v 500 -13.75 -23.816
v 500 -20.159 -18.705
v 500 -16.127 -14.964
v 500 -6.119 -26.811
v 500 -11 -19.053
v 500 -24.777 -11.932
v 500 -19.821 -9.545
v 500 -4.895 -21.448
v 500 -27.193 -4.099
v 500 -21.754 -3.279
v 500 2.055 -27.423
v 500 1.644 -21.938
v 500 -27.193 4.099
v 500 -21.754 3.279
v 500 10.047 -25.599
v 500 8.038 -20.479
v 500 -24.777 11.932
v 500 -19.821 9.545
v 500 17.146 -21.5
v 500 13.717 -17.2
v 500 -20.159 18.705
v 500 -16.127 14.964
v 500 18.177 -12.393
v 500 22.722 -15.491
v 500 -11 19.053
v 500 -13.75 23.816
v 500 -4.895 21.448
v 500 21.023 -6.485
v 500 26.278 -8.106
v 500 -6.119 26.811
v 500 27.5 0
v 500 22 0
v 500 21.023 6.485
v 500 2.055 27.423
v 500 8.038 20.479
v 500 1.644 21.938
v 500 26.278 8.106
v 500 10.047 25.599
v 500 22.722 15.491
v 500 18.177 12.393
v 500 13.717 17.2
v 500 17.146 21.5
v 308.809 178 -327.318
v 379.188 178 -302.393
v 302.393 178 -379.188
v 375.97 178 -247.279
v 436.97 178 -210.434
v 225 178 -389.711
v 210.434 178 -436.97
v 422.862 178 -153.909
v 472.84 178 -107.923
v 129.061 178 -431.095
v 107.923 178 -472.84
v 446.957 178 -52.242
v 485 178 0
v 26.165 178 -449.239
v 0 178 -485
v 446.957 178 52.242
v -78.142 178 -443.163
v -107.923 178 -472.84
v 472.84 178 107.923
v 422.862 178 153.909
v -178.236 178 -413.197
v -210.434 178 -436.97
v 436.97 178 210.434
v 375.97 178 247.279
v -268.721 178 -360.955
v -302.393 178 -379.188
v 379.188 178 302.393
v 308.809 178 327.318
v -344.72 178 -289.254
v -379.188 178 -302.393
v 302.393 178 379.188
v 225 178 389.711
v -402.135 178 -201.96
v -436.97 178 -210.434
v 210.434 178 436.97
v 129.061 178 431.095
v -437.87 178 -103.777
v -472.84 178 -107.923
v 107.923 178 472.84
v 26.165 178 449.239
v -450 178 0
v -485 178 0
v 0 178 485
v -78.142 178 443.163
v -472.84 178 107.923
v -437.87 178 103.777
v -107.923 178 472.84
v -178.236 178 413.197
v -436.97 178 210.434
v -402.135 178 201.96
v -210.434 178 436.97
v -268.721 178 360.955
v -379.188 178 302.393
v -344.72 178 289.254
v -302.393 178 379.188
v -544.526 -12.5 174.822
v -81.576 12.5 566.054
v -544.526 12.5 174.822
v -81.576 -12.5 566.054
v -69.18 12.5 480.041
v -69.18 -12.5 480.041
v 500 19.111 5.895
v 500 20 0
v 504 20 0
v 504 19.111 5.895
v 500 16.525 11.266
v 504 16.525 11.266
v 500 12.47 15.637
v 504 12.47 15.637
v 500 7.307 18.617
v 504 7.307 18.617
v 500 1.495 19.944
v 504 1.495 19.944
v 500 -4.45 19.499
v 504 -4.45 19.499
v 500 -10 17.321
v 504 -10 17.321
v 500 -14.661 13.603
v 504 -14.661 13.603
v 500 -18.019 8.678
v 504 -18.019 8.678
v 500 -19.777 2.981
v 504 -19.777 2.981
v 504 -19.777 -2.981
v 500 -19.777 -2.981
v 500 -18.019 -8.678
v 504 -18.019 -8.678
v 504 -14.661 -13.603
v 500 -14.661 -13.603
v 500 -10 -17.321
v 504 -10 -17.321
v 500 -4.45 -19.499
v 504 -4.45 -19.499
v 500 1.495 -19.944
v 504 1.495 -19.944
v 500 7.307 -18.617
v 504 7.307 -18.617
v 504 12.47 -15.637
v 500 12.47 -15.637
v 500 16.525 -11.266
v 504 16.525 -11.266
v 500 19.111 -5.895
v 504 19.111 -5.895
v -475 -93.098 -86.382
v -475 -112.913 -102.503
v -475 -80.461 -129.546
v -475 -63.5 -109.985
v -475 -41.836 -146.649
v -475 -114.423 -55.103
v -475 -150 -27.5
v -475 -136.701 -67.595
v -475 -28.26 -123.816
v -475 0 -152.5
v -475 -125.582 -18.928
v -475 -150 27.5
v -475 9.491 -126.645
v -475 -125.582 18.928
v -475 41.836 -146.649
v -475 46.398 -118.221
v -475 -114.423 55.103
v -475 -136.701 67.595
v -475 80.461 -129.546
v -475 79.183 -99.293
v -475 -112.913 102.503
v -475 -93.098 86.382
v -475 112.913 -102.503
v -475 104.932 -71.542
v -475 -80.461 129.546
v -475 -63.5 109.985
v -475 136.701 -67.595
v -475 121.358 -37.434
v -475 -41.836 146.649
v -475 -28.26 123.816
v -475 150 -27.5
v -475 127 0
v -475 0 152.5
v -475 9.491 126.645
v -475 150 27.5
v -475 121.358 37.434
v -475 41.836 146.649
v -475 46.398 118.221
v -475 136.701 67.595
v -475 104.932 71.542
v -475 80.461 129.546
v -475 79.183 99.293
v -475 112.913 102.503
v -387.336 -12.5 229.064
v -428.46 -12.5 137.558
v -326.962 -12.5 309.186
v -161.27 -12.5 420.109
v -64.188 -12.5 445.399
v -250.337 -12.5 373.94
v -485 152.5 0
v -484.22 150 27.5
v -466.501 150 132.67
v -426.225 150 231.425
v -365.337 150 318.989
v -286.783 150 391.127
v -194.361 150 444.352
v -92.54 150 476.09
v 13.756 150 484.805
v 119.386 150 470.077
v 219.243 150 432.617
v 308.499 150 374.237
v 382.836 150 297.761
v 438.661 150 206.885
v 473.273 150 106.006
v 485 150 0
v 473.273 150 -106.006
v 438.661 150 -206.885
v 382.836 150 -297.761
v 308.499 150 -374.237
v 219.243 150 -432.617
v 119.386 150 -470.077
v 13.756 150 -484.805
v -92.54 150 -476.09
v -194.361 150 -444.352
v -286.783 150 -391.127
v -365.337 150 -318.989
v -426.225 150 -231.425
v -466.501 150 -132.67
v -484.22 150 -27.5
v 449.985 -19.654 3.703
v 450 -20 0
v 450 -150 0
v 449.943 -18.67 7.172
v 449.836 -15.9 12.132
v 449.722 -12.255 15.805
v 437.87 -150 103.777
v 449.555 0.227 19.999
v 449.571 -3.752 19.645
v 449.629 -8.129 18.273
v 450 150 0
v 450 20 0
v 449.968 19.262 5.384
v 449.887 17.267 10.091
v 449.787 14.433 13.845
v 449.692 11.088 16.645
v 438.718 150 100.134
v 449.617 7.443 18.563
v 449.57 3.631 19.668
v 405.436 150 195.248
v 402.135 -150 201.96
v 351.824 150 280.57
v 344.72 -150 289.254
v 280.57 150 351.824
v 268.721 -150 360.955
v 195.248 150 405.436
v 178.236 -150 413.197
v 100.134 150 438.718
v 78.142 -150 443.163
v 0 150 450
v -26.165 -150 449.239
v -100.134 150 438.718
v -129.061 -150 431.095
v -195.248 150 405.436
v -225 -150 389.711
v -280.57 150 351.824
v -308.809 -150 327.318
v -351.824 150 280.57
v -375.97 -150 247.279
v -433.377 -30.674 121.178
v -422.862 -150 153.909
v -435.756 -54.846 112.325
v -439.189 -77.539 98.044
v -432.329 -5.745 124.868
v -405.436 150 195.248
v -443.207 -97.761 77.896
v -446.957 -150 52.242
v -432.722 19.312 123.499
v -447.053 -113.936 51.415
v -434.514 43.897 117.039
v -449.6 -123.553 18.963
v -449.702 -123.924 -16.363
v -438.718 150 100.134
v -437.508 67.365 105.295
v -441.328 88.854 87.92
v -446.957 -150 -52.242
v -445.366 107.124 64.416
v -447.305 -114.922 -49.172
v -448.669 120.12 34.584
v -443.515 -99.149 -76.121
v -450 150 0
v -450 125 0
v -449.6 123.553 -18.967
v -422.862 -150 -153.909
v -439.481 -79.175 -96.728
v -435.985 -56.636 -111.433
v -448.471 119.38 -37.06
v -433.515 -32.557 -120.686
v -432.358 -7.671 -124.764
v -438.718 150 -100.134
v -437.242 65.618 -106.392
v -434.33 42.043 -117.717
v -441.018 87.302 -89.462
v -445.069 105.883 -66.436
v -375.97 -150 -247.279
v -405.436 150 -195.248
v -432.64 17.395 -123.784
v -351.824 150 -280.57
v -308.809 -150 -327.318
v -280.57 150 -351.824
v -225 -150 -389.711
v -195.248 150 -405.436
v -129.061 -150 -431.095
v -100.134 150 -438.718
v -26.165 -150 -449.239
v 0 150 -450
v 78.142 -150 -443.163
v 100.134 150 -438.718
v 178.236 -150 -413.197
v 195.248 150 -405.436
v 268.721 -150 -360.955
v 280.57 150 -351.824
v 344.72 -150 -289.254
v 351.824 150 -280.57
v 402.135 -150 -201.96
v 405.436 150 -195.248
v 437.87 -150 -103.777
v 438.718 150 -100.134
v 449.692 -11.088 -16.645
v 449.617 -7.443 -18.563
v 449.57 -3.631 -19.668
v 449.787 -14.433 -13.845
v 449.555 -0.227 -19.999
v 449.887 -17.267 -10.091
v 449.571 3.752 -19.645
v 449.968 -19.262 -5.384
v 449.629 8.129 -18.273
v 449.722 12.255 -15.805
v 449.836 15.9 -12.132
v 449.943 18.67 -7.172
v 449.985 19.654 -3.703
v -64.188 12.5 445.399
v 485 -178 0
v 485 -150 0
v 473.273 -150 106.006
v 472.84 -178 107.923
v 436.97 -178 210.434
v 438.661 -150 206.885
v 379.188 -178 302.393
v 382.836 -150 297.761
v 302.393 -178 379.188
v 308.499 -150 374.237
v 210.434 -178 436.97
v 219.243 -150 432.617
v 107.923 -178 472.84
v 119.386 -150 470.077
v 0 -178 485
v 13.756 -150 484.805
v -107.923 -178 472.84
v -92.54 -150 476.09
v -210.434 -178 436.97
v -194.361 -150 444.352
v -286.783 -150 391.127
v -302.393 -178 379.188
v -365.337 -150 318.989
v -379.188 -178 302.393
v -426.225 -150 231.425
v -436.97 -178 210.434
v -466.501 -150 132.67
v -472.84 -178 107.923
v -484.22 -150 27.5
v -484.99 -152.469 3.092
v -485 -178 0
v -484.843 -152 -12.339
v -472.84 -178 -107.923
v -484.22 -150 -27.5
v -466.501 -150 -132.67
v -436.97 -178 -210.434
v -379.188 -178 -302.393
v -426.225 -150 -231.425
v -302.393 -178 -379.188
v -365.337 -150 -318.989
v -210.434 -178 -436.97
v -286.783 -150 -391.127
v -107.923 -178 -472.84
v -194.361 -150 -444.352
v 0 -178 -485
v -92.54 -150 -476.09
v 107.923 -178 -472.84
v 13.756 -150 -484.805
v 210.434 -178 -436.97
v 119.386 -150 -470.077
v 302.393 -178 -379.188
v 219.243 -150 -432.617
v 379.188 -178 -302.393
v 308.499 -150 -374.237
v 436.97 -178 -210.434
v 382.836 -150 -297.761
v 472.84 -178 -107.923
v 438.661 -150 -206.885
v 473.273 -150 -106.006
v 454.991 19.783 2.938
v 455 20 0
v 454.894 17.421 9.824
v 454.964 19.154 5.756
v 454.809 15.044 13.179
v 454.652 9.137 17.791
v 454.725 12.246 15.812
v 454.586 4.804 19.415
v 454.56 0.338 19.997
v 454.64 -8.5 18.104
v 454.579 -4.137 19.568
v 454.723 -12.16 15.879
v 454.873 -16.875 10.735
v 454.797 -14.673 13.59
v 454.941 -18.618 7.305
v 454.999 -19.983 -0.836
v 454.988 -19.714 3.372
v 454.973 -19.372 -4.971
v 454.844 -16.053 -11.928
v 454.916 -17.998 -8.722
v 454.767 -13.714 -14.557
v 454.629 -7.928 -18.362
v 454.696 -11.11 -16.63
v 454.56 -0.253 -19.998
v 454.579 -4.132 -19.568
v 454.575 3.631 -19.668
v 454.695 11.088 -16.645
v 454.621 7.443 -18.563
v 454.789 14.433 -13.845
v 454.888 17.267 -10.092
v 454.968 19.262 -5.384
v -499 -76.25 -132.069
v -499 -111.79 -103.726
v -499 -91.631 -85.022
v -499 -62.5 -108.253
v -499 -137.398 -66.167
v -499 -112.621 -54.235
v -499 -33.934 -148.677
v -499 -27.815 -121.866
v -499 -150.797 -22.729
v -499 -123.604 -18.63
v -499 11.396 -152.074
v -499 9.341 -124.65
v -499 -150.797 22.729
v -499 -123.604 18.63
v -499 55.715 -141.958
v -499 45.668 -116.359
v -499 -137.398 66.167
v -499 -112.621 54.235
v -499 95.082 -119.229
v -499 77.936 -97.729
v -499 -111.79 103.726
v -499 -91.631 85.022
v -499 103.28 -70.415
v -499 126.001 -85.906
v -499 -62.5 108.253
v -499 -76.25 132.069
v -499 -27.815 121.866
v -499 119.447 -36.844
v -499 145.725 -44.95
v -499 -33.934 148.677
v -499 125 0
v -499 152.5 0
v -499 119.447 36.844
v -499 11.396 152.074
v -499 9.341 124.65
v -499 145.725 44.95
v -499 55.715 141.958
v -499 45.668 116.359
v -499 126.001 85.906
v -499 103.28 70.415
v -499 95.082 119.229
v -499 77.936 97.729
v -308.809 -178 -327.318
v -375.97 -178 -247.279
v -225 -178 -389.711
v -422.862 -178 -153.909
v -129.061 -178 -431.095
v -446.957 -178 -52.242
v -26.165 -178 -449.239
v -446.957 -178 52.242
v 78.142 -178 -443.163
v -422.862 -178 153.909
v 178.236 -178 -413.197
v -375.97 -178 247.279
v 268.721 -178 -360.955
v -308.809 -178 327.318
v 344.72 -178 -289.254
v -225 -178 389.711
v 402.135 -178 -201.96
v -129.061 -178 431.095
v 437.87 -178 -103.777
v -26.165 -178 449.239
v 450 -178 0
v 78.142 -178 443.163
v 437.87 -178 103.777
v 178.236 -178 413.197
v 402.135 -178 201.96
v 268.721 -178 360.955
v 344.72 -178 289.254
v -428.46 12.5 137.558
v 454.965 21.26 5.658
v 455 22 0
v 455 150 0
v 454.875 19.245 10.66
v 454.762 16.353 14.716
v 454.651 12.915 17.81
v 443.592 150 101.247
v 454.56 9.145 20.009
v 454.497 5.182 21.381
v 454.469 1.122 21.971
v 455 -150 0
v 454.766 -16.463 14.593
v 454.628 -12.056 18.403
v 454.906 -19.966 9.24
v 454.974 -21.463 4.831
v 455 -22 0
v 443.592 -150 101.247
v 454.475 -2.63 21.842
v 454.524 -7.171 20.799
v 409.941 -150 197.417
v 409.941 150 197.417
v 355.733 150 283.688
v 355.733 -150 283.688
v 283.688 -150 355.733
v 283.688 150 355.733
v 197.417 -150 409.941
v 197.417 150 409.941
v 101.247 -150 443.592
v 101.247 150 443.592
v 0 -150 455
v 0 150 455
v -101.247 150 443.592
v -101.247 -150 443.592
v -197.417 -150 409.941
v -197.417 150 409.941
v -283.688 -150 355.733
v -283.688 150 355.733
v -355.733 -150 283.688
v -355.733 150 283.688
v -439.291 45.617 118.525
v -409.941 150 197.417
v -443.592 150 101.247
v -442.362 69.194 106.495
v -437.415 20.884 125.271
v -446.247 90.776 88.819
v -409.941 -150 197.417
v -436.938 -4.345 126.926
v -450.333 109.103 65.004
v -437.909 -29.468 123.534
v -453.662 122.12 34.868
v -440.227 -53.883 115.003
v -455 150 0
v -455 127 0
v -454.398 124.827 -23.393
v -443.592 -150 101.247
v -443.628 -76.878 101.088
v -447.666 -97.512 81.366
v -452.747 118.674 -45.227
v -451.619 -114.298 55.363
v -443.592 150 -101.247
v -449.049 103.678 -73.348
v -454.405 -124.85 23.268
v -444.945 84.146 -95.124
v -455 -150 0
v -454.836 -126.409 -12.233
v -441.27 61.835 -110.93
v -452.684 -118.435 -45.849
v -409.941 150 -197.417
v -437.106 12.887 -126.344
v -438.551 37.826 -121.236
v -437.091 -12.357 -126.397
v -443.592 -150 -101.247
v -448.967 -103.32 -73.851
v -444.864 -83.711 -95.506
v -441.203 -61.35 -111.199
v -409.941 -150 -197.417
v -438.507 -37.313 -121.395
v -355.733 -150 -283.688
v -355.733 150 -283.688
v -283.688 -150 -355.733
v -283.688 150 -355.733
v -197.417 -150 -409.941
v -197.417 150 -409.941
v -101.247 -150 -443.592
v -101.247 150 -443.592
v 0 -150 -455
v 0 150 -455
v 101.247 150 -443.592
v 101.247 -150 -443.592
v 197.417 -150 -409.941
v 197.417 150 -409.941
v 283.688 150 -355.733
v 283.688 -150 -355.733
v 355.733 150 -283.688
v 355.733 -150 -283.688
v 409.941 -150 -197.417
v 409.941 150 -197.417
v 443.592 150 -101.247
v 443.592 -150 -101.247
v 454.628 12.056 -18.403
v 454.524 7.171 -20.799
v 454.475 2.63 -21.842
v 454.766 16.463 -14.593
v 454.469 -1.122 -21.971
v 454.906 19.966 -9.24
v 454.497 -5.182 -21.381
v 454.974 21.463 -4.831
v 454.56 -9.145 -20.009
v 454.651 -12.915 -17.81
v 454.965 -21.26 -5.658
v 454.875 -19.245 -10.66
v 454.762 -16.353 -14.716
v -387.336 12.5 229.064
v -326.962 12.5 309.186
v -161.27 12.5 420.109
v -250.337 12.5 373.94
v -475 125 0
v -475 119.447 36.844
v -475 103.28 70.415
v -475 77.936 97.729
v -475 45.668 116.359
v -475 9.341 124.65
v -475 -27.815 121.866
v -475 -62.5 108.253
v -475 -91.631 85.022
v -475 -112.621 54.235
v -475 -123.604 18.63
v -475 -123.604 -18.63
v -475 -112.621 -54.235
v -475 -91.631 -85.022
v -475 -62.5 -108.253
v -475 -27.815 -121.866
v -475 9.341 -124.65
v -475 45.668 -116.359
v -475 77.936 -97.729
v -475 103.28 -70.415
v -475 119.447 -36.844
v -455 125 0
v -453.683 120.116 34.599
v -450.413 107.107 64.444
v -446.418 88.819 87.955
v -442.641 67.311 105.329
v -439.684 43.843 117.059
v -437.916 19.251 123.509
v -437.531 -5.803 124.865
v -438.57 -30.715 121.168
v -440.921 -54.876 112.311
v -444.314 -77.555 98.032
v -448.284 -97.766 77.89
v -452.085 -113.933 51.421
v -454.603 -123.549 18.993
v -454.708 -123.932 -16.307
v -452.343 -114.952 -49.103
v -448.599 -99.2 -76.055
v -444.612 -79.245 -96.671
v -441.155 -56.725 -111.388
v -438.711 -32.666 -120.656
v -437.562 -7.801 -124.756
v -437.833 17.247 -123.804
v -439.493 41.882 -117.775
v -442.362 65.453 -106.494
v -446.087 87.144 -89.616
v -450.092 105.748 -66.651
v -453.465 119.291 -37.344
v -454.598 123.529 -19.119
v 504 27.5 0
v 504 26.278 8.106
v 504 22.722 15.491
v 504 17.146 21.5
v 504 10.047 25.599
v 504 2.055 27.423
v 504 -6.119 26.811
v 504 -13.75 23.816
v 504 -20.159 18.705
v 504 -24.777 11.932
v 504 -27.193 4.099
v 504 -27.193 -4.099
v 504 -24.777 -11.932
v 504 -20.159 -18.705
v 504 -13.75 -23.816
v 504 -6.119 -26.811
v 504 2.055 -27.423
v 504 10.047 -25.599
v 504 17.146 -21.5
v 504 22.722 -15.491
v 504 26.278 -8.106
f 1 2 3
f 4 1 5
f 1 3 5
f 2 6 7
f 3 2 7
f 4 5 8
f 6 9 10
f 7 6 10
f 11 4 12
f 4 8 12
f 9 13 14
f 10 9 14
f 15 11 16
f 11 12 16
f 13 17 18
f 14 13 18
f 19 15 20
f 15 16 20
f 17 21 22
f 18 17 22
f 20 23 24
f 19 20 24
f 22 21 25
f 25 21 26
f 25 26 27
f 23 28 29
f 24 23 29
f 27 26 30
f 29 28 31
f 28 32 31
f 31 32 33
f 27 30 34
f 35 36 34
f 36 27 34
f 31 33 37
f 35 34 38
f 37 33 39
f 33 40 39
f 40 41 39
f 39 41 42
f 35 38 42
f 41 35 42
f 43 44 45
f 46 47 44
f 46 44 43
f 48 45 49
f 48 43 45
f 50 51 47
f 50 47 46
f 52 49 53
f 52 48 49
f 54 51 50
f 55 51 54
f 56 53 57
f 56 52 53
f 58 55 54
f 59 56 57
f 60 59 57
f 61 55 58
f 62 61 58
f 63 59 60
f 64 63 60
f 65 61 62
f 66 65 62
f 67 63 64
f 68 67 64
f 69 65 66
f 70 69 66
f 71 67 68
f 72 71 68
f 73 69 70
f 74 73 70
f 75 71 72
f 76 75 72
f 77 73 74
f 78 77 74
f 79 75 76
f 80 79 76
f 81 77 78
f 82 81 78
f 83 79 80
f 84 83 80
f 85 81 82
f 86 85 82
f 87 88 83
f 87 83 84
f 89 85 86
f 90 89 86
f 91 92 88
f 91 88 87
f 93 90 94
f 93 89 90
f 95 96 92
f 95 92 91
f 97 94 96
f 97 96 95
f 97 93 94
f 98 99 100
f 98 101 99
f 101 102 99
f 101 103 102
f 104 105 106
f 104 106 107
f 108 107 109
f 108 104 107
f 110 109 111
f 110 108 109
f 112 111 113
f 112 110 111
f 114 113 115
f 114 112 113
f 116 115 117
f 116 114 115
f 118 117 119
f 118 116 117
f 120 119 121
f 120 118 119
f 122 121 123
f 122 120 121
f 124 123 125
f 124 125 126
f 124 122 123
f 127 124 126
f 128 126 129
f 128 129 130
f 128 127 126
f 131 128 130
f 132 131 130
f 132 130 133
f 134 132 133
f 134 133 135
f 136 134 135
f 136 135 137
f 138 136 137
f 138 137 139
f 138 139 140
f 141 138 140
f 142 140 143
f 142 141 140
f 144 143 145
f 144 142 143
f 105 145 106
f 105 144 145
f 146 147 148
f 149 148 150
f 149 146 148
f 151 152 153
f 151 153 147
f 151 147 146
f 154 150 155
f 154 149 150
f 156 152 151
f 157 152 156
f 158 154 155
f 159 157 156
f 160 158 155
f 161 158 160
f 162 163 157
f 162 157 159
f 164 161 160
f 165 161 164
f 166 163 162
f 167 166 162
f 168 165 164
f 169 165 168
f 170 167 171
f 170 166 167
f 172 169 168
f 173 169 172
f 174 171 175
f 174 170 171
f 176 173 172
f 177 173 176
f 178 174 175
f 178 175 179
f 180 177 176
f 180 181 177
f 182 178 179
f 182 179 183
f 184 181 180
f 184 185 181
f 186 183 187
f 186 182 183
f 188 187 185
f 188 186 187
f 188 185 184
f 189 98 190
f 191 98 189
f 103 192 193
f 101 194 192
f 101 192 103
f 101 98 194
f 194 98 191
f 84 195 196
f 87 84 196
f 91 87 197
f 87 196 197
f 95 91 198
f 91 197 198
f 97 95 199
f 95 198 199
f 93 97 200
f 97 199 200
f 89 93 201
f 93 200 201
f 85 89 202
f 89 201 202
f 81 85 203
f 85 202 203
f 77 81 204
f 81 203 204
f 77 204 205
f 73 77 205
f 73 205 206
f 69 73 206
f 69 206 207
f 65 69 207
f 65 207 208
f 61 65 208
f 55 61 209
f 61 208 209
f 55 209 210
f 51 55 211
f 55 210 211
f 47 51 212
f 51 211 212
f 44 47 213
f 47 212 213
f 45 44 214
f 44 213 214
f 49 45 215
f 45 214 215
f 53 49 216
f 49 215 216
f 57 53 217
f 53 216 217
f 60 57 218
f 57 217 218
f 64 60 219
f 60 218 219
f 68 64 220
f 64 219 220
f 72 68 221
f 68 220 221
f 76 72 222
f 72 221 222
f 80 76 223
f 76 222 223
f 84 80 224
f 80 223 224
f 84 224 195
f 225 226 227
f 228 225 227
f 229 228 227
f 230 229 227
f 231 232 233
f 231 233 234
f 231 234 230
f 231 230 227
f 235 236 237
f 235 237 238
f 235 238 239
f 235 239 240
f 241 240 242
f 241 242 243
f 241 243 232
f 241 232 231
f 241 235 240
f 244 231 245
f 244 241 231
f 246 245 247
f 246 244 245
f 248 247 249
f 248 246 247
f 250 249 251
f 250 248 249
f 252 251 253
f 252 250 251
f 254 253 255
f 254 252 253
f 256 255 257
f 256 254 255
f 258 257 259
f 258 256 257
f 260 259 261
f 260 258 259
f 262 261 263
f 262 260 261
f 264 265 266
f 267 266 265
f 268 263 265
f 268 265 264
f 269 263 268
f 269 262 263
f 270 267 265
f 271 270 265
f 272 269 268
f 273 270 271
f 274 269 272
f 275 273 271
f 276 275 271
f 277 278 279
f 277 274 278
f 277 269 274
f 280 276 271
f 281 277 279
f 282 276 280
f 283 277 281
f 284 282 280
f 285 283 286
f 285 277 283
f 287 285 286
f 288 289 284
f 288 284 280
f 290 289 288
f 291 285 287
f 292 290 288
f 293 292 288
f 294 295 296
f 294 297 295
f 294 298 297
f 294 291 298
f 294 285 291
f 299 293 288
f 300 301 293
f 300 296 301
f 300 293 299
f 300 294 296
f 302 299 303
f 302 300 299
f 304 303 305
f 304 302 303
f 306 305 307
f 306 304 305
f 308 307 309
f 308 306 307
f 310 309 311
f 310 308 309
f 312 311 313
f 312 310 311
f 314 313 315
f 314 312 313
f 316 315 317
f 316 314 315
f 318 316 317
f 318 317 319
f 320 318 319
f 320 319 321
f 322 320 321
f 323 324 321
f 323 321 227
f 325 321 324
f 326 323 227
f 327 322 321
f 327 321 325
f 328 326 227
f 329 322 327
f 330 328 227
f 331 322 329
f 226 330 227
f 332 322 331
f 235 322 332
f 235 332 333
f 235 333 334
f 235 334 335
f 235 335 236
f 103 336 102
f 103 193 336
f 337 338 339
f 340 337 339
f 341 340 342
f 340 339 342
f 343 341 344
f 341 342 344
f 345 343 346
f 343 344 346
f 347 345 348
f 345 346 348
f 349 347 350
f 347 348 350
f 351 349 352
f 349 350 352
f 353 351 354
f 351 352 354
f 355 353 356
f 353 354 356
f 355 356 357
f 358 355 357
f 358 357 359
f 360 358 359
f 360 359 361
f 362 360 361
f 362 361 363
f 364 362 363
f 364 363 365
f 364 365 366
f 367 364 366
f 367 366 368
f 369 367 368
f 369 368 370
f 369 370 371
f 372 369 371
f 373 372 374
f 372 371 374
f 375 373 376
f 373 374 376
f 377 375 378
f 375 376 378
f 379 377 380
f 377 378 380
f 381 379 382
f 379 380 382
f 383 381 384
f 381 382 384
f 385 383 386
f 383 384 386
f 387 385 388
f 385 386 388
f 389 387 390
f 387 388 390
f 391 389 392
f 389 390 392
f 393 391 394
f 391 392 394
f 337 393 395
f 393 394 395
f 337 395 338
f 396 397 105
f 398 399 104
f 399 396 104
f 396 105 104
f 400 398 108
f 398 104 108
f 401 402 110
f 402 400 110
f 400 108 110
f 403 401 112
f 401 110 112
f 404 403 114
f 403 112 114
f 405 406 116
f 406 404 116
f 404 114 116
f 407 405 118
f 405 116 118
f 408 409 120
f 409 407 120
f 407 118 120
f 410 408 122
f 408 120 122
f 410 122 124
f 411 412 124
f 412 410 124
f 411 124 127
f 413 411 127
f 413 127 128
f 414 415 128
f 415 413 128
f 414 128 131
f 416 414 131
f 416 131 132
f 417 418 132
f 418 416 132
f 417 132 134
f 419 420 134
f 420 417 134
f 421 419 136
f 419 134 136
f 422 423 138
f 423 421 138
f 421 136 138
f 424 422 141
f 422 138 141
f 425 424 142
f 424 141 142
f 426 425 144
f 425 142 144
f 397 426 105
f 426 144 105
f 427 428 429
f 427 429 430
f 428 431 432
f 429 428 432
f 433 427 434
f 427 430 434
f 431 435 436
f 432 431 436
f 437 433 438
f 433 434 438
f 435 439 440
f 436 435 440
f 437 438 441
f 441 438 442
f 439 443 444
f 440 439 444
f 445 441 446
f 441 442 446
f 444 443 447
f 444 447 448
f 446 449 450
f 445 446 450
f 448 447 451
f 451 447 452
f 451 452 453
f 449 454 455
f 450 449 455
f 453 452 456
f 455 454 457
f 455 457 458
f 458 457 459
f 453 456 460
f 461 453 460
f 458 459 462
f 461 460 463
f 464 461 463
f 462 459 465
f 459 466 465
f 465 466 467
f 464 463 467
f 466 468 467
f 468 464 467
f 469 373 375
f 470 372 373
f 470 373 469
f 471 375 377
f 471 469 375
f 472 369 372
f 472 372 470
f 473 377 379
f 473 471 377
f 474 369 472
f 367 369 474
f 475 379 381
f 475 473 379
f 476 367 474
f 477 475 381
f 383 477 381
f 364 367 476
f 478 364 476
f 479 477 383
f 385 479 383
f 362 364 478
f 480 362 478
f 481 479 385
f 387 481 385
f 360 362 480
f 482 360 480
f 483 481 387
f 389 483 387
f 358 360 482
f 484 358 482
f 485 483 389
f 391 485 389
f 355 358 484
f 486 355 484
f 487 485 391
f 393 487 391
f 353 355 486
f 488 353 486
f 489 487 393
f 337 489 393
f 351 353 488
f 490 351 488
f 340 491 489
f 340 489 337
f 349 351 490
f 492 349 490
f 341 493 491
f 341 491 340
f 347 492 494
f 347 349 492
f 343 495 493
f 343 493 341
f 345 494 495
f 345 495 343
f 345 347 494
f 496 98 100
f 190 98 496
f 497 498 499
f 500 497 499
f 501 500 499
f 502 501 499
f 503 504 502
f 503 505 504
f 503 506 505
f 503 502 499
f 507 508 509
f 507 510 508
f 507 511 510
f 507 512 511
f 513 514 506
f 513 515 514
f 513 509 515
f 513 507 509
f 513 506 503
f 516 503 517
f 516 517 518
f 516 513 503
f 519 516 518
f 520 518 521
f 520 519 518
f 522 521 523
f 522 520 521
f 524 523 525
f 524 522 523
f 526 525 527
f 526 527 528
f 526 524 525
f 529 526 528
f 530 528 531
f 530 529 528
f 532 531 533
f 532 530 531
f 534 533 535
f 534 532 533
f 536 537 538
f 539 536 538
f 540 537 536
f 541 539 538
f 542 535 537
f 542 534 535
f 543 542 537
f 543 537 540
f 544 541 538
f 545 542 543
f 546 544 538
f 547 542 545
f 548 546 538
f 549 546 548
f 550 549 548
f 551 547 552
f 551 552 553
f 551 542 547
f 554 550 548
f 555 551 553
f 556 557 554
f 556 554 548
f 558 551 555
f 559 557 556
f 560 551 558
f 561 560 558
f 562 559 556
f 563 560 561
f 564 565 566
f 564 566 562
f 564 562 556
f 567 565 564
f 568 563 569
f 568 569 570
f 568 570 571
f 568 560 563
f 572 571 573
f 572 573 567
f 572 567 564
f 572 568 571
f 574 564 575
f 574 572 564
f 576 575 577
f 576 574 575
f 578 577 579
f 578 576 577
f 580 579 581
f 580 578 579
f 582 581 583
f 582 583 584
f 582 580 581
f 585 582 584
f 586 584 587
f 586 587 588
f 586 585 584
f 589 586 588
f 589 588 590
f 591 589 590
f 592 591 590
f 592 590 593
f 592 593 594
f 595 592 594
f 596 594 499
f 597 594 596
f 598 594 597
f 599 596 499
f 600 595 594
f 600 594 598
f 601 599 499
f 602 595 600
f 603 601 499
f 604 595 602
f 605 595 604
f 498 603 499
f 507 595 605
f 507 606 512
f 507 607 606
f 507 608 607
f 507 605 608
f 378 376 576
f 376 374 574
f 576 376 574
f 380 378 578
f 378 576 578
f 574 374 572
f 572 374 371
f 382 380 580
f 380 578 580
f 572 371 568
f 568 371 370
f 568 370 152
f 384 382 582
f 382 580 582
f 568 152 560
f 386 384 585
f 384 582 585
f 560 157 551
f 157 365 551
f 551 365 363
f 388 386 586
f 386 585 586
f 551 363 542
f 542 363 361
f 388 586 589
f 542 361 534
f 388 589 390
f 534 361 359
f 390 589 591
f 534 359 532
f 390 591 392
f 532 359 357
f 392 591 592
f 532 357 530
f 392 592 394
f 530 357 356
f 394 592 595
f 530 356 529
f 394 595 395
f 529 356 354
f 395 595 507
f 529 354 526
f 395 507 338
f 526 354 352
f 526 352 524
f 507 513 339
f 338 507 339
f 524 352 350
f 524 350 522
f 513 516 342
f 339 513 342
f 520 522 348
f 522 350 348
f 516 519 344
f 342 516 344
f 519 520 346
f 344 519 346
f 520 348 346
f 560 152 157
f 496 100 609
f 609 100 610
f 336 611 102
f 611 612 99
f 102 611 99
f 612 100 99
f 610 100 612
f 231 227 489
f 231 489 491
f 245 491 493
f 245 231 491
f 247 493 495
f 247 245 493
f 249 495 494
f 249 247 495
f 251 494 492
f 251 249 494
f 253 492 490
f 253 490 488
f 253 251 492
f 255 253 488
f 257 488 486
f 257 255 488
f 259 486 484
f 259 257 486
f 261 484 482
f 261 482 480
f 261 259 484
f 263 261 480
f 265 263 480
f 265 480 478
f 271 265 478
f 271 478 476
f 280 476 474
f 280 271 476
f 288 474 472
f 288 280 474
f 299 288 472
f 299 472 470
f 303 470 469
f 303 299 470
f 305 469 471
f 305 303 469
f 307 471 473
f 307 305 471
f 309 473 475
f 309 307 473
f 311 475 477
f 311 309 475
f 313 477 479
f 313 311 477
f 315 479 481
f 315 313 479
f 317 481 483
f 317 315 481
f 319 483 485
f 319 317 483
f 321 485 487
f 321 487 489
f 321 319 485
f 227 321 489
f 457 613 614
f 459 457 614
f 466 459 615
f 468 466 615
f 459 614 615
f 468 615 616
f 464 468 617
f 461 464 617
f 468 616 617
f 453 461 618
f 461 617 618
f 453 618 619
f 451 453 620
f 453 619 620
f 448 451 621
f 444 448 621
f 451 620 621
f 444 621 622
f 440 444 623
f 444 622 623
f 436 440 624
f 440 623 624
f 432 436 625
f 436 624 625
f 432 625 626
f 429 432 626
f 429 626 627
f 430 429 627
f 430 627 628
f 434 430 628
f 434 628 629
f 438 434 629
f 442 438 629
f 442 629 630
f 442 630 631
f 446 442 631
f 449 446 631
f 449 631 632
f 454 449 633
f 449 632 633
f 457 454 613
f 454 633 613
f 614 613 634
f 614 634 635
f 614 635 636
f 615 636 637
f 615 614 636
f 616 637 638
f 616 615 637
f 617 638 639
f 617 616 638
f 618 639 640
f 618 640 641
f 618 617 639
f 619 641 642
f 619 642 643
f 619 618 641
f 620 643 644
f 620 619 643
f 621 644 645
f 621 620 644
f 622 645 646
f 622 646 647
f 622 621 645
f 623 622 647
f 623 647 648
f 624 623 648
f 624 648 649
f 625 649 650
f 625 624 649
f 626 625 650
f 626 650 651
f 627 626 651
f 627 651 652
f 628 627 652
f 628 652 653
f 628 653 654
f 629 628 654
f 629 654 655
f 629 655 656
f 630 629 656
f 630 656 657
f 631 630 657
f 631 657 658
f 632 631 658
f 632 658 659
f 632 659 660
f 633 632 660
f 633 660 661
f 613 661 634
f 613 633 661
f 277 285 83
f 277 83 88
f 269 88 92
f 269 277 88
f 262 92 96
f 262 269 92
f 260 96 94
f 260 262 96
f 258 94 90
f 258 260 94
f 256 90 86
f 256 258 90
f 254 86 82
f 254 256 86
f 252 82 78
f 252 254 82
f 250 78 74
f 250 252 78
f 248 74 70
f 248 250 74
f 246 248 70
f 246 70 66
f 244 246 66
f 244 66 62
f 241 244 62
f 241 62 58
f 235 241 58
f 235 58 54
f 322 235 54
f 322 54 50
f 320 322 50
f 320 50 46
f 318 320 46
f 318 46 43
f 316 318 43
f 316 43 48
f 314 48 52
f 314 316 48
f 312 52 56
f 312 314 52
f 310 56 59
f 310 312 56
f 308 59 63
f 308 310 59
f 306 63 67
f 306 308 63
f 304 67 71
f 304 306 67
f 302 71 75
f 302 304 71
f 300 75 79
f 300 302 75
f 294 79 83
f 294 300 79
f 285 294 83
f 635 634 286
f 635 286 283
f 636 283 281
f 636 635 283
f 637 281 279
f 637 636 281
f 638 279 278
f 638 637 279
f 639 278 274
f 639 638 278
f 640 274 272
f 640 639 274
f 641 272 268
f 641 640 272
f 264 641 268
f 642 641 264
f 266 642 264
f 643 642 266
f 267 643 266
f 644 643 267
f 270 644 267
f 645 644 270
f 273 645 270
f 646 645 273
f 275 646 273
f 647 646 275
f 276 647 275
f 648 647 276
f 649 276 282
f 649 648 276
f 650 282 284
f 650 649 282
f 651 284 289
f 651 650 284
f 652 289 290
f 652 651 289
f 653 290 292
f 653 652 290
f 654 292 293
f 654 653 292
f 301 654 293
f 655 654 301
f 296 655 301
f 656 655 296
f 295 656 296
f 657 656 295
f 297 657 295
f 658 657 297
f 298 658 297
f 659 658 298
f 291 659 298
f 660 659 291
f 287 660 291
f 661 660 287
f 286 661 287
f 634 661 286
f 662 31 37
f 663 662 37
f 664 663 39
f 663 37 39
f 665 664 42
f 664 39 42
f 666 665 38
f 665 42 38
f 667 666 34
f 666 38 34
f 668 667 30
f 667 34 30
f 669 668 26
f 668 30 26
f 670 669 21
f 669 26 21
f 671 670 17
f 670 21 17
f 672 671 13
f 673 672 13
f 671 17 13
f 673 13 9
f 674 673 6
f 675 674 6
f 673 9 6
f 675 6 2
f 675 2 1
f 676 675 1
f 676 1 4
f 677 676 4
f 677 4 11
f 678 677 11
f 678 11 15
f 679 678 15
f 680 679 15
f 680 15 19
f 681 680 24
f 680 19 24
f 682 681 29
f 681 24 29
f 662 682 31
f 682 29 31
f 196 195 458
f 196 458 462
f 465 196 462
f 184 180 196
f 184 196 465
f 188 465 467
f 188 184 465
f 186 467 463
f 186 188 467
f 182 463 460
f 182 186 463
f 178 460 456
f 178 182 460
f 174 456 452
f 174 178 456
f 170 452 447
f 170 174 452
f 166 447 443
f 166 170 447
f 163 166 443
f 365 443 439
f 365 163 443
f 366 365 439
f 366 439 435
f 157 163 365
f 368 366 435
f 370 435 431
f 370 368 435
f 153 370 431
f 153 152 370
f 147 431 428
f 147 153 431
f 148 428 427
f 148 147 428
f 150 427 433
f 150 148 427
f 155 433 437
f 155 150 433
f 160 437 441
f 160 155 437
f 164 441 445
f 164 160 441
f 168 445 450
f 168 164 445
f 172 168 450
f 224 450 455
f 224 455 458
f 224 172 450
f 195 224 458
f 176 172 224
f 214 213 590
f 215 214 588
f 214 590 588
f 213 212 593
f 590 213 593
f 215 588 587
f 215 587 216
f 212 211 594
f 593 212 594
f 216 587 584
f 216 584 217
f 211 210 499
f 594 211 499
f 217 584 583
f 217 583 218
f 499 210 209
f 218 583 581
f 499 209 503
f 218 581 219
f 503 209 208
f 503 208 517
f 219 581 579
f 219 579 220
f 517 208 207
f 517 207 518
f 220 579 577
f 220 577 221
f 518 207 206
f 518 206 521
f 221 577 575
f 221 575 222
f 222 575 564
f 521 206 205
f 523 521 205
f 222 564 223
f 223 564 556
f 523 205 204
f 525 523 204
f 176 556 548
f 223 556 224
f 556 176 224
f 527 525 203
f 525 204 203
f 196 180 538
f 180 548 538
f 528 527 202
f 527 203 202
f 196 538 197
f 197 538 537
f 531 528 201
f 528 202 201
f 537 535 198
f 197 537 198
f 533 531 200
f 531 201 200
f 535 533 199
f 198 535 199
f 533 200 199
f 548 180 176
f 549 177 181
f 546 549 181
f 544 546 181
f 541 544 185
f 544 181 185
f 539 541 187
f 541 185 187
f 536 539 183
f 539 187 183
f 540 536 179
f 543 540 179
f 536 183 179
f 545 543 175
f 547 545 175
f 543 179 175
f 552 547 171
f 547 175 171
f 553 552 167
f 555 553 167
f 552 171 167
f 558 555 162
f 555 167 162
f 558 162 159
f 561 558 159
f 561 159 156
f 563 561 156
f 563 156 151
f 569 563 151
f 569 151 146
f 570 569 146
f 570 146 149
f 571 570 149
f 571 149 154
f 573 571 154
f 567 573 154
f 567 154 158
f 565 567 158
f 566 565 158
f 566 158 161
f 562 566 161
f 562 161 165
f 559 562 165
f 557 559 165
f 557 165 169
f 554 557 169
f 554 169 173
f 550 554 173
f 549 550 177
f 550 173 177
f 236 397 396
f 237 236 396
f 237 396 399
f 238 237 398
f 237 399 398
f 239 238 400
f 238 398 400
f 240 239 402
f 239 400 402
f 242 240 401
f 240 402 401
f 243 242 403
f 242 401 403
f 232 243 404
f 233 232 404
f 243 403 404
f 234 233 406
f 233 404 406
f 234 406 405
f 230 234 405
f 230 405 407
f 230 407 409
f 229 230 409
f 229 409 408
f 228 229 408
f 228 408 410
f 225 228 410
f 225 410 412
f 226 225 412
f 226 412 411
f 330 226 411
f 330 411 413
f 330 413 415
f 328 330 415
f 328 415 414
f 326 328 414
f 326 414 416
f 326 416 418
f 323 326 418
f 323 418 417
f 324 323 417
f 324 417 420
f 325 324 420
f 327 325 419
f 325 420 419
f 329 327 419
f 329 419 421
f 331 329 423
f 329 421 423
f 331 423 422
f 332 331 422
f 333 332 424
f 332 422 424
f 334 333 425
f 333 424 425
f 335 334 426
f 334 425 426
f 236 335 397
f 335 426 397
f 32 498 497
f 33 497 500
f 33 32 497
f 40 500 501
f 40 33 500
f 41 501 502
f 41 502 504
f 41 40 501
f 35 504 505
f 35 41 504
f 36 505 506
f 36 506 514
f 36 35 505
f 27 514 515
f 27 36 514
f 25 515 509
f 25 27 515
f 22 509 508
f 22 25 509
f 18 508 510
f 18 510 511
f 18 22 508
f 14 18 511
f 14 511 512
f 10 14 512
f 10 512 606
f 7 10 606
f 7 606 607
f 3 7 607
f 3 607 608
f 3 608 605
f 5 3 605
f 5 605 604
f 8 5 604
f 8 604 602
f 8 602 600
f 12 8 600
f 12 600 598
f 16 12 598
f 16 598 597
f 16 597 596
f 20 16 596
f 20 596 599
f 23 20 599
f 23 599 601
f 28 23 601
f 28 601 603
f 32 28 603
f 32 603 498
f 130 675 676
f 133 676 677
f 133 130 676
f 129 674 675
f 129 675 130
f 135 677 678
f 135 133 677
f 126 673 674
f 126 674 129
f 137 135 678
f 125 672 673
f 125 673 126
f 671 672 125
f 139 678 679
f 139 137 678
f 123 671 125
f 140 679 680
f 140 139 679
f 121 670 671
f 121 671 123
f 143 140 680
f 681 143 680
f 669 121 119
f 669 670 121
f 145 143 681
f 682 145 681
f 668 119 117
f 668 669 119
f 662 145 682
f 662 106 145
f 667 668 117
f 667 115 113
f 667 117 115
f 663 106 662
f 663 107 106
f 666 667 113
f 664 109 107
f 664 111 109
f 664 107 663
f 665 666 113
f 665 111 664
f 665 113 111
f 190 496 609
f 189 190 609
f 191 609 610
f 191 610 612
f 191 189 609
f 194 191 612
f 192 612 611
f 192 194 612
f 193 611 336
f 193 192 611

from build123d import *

# Parameters (mm, degrees)
F0_R      = 455
F0_R_2    = 450
F1_DEPTH  = 150
F2_R      = 485
F2_R_2    = 455
F2_R_3    = 450
F3_DEPTH  = 28
F4_R      = 485
F4_R_2    = 455
F4_R_3    = 450
F5_DEPTH  = 28
F7_R      = 22
F7_R_2    = 20
F8_DEPTH  = 45.532179457
F9_REACH  = 1041.5695424949
F11_R     = 127
F11_R_2   = 125
F13_REACH = 1328.5543906933
F11_R_3   = 152.5
F14_DEPTH = 24
F7_R_3    = 27.5
F15_DEPTH = 4
F17_DEPTH = 12.5


with BuildPart() as f1:
    # F0 (on Front) → F1 (new body, symmetric)
    with BuildSketch(Plane.XZ):
        Circle(F0_R)
        Circle(F0_R_2, mode=Mode.SUBTRACT)
    extrude(amount=F1_DEPTH, both=True)

    # F2 (on face) → F3 (join)
    with BuildSketch(Plane(origin=(0, 150, 0), x_dir=(-1, 0, 0), z_dir=(0, 1, 0))):
        Circle(F2_R)
        Circle(F2_R_2, mode=Mode.SUBTRACT)
        Circle(F2_R_2)
        Circle(F2_R_3, mode=Mode.SUBTRACT)
    extrude(amount=F3_DEPTH)

    # F4 (on face) → F5 (join)
    with BuildSketch(Plane.XZ.offset(150)):
        Circle(F4_R)
        Circle(F4_R_2, mode=Mode.SUBTRACT)
        Circle(F4_R_2)
        Circle(F4_R_3, mode=Mode.SUBTRACT)
    extrude(amount=F5_DEPTH)

    # F7 (on offset) → F8 (join, through all)
    with BuildSketch(Plane.YZ.offset(500)):
        Circle(F7_R)
        Circle(F7_R_2, mode=Mode.SUBTRACT)
    extrude(amount=-F8_DEPTH)

    f9_end = f1.faces().sort_by_distance((-450, 0, 0))[0]
    # F7 (on offset) → F9 (cut, up to a face of the model that its end follows)
    with BuildSketch(Plane.YZ.offset(500)):
        Circle(F7_R_2)
    f9_long = extrude(amount=-F9_REACH, mode=Mode.PRIVATE)
    add(split(f9_long, bisect_by=f9_end, keep=Keep.ALL, mode=Mode.PRIVATE).solids().sort_by_distance((500, 0, 0))[0], mode=Mode.SUBTRACT)

    # F11 (on offset) → F12 (join, up to the next surface of F1)
    with BuildSketch(Plane.YZ.offset(-475)):
        Circle(F11_R)
        Circle(F11_R_2, mode=Mode.SUBTRACT)
    extrude(until=Until.NEXT)

    f13_end = f1.faces().sort_by_distance((-450, 0, 0))[0]
    # F11 (on offset) → F13 (cut, up to a face of the model that its end follows)
    with BuildSketch(Plane.YZ.offset(-475)):
        Circle(F11_R_2)
    f13_long = extrude(amount=F13_REACH, mode=Mode.PRIVATE)
    add(split(f13_long, bisect_by=f13_end, keep=Keep.BOTTOM, mode=Mode.PRIVATE), mode=Mode.SUBTRACT)

    # F11 (on offset) → F14 (join)
    with BuildSketch(Plane.YZ.offset(-475)):
        Circle(F11_R_3)
        Circle(F11_R, mode=Mode.SUBTRACT)
        Circle(F11_R)
        Circle(F11_R_2, mode=Mode.SUBTRACT)
    extrude(amount=-F14_DEPTH)

    # F7 (on offset) → F15 (join)
    with BuildSketch(Plane.YZ.offset(500)):
        Circle(F7_R_3)
        Circle(F7_R, mode=Mode.SUBTRACT)
        Circle(F7_R)
        Circle(F7_R_2, mode=Mode.SUBTRACT)
    extrude(amount=F15_DEPTH)


with BuildPart() as f17:
    # F16 (on Front) → F17 (new body, symmetric)
    with BuildSketch(Plane.XZ):
        with BuildLine():
            Line((-81.575987868, 566.0536310474), (-313.0510903458, 370.4375991086))
            Line((-313.0510903458, 370.4375991086), (-544.5261928236, 174.8215671697))
            Line((-544.5261928236, 174.8215671697), (-475, 152.5))
            Line((-475, 152.5), (-428.459753627, 137.5581314276))
            ThreePointArc((-428.459753627, 137.5581314276), (-290.4597745476, 343.7049888636), (-64.1879640033, 445.3985914629))
            Line((-64.1879640033, 445.3985914629), (-69.1803612035, 480.0407041322))
            Line((-69.1803612035, 480.0407041322), (-81.575987868, 566.0536310474))
        make_face()
    extrude(amount=F17_DEPTH, both=True)


solid = Compound([f1.part, f17.part])
